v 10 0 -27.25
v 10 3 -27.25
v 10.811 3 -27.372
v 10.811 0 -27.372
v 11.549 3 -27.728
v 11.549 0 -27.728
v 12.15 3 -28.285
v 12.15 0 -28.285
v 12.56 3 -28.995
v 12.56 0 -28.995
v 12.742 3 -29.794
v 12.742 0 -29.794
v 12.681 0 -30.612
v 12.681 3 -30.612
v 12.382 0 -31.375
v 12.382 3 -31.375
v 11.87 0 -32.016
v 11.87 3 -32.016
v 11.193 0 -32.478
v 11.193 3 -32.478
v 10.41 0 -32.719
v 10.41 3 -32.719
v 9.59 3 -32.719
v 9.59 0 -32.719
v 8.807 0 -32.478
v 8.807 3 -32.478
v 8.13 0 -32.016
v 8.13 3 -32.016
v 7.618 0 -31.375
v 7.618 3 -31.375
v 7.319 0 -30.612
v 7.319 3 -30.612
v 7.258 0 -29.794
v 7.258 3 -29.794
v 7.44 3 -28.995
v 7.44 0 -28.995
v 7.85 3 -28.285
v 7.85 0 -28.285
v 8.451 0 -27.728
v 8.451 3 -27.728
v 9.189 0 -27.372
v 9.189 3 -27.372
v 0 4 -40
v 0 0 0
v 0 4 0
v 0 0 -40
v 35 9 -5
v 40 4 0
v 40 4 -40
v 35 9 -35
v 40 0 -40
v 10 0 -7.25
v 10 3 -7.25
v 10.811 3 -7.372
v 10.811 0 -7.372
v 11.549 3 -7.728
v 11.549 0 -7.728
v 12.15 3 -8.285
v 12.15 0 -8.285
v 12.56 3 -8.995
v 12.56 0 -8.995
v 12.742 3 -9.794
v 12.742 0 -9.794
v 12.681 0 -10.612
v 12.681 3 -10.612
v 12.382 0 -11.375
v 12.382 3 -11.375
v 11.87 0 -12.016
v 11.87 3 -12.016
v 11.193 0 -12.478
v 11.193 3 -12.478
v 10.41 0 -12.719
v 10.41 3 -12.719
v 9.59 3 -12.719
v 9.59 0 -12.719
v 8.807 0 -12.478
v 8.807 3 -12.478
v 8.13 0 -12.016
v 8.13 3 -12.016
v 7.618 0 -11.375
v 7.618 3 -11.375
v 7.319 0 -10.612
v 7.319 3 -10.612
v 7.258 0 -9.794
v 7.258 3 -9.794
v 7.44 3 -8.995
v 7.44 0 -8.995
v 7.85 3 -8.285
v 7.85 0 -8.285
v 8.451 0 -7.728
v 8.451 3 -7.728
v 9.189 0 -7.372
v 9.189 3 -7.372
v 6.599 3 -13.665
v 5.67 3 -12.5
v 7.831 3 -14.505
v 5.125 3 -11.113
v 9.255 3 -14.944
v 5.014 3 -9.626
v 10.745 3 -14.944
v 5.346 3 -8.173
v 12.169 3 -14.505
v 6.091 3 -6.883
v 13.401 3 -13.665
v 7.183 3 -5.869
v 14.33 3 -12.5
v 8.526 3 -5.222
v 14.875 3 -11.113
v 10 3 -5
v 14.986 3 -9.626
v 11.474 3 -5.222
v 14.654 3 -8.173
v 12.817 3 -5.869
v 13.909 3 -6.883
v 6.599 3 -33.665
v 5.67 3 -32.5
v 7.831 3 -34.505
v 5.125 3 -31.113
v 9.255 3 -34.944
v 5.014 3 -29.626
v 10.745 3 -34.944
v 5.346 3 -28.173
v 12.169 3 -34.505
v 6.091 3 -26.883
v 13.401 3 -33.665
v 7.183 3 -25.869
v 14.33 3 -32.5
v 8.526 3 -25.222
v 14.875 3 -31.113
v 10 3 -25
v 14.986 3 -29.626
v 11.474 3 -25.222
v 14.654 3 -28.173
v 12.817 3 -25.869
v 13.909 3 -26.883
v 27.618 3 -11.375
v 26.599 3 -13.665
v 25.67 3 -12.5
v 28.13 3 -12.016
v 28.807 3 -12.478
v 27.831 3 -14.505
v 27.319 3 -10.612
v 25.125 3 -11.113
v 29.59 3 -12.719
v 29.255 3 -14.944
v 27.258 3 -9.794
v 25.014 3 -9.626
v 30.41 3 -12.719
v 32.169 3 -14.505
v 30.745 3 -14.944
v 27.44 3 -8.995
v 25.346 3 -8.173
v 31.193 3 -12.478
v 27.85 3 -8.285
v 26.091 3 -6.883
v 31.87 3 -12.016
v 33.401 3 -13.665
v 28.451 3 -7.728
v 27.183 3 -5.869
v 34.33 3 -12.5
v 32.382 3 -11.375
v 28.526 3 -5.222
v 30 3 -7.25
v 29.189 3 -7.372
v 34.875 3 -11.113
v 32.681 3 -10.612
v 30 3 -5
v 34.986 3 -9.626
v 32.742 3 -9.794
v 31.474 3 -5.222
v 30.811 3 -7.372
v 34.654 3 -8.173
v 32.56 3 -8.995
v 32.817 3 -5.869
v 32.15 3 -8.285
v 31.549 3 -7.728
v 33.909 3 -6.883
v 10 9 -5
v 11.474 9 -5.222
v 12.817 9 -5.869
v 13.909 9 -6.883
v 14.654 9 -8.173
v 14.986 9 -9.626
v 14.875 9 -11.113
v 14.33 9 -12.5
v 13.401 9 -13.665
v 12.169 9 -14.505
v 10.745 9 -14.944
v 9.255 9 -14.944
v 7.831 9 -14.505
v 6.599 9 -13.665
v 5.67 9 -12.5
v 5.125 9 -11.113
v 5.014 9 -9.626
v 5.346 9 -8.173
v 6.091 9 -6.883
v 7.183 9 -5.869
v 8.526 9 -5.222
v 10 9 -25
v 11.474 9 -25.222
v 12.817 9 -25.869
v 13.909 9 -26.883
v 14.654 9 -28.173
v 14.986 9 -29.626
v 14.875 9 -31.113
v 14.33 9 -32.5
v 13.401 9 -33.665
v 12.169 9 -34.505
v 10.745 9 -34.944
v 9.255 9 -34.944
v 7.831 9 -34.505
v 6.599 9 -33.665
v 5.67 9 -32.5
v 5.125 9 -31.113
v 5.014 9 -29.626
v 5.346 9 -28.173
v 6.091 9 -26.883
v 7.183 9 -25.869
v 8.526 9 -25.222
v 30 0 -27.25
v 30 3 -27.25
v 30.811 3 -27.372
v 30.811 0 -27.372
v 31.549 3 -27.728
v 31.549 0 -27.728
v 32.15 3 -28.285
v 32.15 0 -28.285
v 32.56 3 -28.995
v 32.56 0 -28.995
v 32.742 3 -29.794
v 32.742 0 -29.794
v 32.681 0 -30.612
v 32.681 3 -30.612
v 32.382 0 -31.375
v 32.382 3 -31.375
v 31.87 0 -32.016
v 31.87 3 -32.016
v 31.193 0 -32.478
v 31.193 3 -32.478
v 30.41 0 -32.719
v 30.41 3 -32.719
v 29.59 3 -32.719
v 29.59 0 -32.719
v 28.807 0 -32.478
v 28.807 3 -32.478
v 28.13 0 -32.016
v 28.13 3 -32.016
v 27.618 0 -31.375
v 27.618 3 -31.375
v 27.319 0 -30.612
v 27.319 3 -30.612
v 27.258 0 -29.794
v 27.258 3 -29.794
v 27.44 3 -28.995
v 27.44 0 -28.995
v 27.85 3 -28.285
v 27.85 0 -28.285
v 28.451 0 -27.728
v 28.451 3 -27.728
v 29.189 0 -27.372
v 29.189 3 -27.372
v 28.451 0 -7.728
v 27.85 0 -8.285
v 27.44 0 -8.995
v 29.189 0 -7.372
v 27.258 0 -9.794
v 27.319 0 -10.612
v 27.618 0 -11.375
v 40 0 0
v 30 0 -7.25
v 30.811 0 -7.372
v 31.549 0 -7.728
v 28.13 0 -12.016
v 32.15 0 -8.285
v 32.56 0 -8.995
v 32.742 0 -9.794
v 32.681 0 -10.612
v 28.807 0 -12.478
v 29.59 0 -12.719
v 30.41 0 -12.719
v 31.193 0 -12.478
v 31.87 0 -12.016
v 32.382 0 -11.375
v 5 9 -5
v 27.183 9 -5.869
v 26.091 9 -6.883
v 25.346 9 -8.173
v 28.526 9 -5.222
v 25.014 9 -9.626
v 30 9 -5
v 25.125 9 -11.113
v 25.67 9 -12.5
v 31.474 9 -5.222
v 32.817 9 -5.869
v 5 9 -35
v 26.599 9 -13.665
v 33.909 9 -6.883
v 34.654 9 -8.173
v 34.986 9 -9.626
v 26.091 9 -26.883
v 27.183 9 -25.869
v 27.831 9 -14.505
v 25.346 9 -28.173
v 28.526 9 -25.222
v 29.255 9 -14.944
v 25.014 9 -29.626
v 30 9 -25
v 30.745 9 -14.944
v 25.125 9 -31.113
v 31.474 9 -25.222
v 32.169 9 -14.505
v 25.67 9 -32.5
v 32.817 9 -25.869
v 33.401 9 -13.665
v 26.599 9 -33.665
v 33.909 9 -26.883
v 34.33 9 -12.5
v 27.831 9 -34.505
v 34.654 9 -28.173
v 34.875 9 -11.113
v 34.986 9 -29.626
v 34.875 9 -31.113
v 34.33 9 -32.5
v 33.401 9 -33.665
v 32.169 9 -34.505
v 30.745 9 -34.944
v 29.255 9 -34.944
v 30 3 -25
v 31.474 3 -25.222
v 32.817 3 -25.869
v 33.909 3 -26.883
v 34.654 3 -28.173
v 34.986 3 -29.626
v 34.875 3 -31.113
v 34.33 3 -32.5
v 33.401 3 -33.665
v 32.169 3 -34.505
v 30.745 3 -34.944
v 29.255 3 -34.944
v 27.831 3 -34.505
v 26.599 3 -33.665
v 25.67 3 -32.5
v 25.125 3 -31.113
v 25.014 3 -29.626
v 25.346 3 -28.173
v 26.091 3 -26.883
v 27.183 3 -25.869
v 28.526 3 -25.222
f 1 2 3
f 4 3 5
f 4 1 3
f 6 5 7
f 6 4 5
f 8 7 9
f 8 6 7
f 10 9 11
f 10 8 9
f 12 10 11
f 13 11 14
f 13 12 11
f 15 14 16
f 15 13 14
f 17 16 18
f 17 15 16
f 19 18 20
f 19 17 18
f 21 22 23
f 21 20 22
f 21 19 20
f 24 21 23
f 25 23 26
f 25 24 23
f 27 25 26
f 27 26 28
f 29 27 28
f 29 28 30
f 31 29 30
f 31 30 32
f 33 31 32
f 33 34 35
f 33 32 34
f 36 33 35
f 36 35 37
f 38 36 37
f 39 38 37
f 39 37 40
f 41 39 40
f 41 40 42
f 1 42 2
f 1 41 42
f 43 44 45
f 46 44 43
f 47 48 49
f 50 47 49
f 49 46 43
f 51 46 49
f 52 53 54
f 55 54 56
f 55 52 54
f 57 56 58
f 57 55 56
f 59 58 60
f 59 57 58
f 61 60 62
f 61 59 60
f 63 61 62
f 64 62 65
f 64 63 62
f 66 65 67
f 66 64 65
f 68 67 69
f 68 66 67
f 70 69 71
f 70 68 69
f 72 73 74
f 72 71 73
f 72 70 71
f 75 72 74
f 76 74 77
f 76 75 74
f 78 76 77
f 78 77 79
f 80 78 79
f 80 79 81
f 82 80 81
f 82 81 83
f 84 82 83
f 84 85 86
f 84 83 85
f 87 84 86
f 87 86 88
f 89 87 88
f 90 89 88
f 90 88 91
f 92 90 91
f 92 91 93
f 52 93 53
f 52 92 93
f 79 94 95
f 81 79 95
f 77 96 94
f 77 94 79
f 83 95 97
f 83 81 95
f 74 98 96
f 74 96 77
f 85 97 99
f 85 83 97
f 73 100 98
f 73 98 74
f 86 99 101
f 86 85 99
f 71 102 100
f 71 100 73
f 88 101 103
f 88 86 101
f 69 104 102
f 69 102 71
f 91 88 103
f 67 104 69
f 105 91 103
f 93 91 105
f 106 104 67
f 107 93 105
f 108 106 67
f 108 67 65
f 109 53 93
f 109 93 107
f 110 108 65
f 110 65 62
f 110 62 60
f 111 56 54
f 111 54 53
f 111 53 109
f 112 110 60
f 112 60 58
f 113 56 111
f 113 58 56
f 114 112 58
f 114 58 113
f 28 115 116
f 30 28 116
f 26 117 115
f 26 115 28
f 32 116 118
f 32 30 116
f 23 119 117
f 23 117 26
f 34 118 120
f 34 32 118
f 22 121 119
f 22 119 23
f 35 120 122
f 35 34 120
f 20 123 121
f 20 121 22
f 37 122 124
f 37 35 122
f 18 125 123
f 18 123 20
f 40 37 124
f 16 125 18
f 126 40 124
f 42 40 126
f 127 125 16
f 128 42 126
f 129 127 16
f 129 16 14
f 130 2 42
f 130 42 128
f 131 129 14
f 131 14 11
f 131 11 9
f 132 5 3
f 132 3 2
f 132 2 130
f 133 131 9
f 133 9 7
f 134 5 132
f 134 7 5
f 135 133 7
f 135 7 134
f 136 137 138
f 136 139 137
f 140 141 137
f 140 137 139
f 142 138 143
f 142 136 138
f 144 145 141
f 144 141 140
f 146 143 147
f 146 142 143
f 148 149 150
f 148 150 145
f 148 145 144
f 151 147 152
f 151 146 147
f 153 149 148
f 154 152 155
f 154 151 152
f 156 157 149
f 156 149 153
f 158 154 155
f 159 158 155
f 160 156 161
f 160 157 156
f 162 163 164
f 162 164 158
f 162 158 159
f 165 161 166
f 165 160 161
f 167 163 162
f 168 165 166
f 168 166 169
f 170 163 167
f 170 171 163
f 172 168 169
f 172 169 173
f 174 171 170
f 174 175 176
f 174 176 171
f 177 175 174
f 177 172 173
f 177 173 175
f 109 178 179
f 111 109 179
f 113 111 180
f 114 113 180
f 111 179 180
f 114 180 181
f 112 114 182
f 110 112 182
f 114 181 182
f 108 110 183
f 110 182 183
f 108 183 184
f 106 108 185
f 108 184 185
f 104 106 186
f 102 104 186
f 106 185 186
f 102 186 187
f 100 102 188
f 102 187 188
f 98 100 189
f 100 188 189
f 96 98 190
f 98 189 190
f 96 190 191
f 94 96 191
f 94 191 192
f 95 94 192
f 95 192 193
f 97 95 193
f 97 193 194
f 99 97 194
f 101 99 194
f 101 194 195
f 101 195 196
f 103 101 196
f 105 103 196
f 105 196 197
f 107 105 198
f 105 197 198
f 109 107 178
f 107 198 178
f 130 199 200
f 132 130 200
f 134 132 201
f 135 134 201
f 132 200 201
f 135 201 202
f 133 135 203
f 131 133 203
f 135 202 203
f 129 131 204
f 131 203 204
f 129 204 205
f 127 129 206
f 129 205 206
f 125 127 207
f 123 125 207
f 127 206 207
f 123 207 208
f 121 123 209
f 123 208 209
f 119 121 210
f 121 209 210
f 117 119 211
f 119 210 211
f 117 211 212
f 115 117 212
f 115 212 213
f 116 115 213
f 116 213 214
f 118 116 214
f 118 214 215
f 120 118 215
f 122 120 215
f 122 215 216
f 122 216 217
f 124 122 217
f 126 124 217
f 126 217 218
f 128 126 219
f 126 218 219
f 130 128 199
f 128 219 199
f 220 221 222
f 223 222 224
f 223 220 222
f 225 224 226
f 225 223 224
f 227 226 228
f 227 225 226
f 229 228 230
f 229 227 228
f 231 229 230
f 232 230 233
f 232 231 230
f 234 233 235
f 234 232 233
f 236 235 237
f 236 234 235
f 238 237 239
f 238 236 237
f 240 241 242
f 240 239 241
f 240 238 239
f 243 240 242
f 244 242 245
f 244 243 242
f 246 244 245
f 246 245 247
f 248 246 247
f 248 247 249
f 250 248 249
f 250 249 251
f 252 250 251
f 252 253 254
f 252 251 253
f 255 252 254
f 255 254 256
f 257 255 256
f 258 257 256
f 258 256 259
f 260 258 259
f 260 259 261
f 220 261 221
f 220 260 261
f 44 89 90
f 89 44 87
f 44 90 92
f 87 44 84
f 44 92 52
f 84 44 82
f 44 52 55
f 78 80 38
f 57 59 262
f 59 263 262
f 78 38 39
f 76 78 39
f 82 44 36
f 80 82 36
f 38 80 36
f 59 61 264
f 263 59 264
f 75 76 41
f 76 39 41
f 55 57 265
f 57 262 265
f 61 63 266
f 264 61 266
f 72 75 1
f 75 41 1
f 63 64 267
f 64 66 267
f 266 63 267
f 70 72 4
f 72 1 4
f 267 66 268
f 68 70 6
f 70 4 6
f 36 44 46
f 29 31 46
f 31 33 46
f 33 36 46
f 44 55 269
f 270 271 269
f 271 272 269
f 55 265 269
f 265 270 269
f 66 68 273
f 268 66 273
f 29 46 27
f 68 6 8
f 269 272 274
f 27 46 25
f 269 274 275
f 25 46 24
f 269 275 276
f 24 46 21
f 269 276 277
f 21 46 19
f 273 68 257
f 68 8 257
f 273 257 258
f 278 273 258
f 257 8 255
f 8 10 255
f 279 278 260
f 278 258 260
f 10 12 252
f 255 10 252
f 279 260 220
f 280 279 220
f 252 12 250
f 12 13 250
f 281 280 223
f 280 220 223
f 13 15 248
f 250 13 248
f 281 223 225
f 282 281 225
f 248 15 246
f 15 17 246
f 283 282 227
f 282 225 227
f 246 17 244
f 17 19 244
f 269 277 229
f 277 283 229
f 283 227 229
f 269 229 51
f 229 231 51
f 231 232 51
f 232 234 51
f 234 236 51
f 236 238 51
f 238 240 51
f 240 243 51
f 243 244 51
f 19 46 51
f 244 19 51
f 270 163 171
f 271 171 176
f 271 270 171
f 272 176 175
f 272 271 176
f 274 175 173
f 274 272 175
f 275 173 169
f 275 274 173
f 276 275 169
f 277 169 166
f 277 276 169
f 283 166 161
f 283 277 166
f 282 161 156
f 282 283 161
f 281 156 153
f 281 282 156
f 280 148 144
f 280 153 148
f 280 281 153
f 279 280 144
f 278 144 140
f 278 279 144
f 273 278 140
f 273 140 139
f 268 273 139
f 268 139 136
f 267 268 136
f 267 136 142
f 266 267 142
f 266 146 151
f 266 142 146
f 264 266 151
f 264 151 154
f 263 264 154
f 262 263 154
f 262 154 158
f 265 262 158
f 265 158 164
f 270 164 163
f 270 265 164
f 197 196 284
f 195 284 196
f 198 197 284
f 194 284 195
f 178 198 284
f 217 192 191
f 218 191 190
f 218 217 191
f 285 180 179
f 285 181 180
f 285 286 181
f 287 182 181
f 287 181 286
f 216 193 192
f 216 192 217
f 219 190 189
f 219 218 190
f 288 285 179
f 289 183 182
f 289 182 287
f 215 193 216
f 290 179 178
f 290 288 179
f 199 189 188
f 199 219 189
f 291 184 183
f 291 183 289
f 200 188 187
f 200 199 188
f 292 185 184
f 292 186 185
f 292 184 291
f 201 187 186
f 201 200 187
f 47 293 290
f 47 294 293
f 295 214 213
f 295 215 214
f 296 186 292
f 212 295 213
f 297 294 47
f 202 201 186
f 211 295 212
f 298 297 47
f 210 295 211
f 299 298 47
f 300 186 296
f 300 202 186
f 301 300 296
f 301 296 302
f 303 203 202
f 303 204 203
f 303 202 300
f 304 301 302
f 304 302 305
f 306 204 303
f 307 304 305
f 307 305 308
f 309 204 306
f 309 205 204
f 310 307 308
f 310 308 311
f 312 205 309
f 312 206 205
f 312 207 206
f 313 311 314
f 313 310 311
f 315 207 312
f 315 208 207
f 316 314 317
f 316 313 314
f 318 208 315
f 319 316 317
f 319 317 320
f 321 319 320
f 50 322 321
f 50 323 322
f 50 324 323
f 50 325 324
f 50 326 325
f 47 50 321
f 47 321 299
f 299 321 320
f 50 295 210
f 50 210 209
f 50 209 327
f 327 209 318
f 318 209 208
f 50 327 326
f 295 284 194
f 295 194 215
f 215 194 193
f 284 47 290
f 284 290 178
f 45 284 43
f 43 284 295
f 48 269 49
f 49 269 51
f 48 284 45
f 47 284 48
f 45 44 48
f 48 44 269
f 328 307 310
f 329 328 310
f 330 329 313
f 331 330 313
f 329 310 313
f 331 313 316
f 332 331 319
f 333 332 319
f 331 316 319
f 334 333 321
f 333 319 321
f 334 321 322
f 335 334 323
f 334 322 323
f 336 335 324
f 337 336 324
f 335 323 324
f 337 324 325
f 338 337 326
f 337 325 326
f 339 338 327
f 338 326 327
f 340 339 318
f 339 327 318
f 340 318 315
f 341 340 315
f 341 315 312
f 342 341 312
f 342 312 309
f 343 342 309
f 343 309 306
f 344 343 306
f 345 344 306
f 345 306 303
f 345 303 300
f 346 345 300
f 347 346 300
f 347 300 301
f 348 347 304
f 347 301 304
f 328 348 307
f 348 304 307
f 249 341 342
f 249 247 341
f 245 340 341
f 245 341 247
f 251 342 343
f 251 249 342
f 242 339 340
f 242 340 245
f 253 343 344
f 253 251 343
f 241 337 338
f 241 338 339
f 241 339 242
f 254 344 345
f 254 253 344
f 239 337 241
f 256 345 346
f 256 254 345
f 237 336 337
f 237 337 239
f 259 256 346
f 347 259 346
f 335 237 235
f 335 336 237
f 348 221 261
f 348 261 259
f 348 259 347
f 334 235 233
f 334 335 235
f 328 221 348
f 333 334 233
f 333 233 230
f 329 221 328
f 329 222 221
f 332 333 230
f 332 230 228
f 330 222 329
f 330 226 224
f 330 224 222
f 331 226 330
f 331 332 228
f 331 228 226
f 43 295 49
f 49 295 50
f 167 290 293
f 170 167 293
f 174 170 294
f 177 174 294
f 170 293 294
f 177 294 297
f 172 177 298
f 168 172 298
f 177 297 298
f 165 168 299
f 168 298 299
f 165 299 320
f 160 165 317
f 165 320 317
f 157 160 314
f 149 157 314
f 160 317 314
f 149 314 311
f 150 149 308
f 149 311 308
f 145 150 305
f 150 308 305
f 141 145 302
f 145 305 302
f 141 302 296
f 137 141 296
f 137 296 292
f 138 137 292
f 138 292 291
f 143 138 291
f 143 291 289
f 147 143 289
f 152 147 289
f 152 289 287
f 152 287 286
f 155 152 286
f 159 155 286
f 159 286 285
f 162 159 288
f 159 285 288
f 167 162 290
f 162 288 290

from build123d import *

# Parameters (mm, degrees)
SKETCH1_W           = 40
SKETCH1_H           = 40
SKETCH1_R           = 2.75
BOSS_EXTRUDE1_DEPTH = 9
SKETCH2_R           = 5
CUT_EXTRUDE1_DEPTH  = 6
CHAMFER1_SIZE       = 5


with BuildPart() as part:
    # Sketch1 → Boss-Extrude1 (new body)
    with BuildSketch(Plane(origin=(0, 0, 0), x_dir=(1, 0, 0), z_dir=(0, 1, 0))):
        with Locations((20, 20)):
            Rectangle(SKETCH1_W, SKETCH1_H)
        with Locations(Location((10, 30, 0), (0, 0, 270))):
            Circle(SKETCH1_R, mode=Mode.SUBTRACT)
        with Locations(Location((30, 30, 0), (0, 0, 270))):
            Circle(SKETCH1_R, mode=Mode.SUBTRACT)
        with Locations(Location((30, 10, 0), (0, 0, 270))):
            Circle(SKETCH1_R, mode=Mode.SUBTRACT)
        with Locations(Location((10, 10, 0), (0, 0, 270))):
            Circle(SKETCH1_R, mode=Mode.SUBTRACT)
    extrude(amount=BOSS_EXTRUDE1_DEPTH)

    # Sketch2 → Cut-Extrude1 (cut)
    with BuildSketch(Plane(origin=(0, 9, 0), x_dir=(1, 0, 0), z_dir=(0, 1, 0))):
        with Locations(Location((10, 10, 0), (0, 0, 270))):
            Circle(SKETCH2_R)
        with Locations(Location((30, 10, 0), (0, 0, 270))):
            Circle(SKETCH2_R)
        with Locations(Location((30, 30, 0), (0, 0, 270))):
            Circle(SKETCH2_R)
        with Locations(Location((10, 30, 0), (0, 0, 270))):
            Circle(SKETCH2_R)
    extrude(amount=-CUT_EXTRUDE1_DEPTH, mode=Mode.SUBTRACT)

    # Chamfer1
    chamfer1_edges = [part.edges().sort_by_distance(p)[0] for p in [
        (40, 9, -20),
        (20, 9, -40),
        (0, 9, -20),
        (20, 9, 0),
    ]]
    chamfer(chamfer1_edges, length=CHAMFER1_SIZE - 0.0001)  # a hair under: the kernel refuses the full size


solid = part.part
